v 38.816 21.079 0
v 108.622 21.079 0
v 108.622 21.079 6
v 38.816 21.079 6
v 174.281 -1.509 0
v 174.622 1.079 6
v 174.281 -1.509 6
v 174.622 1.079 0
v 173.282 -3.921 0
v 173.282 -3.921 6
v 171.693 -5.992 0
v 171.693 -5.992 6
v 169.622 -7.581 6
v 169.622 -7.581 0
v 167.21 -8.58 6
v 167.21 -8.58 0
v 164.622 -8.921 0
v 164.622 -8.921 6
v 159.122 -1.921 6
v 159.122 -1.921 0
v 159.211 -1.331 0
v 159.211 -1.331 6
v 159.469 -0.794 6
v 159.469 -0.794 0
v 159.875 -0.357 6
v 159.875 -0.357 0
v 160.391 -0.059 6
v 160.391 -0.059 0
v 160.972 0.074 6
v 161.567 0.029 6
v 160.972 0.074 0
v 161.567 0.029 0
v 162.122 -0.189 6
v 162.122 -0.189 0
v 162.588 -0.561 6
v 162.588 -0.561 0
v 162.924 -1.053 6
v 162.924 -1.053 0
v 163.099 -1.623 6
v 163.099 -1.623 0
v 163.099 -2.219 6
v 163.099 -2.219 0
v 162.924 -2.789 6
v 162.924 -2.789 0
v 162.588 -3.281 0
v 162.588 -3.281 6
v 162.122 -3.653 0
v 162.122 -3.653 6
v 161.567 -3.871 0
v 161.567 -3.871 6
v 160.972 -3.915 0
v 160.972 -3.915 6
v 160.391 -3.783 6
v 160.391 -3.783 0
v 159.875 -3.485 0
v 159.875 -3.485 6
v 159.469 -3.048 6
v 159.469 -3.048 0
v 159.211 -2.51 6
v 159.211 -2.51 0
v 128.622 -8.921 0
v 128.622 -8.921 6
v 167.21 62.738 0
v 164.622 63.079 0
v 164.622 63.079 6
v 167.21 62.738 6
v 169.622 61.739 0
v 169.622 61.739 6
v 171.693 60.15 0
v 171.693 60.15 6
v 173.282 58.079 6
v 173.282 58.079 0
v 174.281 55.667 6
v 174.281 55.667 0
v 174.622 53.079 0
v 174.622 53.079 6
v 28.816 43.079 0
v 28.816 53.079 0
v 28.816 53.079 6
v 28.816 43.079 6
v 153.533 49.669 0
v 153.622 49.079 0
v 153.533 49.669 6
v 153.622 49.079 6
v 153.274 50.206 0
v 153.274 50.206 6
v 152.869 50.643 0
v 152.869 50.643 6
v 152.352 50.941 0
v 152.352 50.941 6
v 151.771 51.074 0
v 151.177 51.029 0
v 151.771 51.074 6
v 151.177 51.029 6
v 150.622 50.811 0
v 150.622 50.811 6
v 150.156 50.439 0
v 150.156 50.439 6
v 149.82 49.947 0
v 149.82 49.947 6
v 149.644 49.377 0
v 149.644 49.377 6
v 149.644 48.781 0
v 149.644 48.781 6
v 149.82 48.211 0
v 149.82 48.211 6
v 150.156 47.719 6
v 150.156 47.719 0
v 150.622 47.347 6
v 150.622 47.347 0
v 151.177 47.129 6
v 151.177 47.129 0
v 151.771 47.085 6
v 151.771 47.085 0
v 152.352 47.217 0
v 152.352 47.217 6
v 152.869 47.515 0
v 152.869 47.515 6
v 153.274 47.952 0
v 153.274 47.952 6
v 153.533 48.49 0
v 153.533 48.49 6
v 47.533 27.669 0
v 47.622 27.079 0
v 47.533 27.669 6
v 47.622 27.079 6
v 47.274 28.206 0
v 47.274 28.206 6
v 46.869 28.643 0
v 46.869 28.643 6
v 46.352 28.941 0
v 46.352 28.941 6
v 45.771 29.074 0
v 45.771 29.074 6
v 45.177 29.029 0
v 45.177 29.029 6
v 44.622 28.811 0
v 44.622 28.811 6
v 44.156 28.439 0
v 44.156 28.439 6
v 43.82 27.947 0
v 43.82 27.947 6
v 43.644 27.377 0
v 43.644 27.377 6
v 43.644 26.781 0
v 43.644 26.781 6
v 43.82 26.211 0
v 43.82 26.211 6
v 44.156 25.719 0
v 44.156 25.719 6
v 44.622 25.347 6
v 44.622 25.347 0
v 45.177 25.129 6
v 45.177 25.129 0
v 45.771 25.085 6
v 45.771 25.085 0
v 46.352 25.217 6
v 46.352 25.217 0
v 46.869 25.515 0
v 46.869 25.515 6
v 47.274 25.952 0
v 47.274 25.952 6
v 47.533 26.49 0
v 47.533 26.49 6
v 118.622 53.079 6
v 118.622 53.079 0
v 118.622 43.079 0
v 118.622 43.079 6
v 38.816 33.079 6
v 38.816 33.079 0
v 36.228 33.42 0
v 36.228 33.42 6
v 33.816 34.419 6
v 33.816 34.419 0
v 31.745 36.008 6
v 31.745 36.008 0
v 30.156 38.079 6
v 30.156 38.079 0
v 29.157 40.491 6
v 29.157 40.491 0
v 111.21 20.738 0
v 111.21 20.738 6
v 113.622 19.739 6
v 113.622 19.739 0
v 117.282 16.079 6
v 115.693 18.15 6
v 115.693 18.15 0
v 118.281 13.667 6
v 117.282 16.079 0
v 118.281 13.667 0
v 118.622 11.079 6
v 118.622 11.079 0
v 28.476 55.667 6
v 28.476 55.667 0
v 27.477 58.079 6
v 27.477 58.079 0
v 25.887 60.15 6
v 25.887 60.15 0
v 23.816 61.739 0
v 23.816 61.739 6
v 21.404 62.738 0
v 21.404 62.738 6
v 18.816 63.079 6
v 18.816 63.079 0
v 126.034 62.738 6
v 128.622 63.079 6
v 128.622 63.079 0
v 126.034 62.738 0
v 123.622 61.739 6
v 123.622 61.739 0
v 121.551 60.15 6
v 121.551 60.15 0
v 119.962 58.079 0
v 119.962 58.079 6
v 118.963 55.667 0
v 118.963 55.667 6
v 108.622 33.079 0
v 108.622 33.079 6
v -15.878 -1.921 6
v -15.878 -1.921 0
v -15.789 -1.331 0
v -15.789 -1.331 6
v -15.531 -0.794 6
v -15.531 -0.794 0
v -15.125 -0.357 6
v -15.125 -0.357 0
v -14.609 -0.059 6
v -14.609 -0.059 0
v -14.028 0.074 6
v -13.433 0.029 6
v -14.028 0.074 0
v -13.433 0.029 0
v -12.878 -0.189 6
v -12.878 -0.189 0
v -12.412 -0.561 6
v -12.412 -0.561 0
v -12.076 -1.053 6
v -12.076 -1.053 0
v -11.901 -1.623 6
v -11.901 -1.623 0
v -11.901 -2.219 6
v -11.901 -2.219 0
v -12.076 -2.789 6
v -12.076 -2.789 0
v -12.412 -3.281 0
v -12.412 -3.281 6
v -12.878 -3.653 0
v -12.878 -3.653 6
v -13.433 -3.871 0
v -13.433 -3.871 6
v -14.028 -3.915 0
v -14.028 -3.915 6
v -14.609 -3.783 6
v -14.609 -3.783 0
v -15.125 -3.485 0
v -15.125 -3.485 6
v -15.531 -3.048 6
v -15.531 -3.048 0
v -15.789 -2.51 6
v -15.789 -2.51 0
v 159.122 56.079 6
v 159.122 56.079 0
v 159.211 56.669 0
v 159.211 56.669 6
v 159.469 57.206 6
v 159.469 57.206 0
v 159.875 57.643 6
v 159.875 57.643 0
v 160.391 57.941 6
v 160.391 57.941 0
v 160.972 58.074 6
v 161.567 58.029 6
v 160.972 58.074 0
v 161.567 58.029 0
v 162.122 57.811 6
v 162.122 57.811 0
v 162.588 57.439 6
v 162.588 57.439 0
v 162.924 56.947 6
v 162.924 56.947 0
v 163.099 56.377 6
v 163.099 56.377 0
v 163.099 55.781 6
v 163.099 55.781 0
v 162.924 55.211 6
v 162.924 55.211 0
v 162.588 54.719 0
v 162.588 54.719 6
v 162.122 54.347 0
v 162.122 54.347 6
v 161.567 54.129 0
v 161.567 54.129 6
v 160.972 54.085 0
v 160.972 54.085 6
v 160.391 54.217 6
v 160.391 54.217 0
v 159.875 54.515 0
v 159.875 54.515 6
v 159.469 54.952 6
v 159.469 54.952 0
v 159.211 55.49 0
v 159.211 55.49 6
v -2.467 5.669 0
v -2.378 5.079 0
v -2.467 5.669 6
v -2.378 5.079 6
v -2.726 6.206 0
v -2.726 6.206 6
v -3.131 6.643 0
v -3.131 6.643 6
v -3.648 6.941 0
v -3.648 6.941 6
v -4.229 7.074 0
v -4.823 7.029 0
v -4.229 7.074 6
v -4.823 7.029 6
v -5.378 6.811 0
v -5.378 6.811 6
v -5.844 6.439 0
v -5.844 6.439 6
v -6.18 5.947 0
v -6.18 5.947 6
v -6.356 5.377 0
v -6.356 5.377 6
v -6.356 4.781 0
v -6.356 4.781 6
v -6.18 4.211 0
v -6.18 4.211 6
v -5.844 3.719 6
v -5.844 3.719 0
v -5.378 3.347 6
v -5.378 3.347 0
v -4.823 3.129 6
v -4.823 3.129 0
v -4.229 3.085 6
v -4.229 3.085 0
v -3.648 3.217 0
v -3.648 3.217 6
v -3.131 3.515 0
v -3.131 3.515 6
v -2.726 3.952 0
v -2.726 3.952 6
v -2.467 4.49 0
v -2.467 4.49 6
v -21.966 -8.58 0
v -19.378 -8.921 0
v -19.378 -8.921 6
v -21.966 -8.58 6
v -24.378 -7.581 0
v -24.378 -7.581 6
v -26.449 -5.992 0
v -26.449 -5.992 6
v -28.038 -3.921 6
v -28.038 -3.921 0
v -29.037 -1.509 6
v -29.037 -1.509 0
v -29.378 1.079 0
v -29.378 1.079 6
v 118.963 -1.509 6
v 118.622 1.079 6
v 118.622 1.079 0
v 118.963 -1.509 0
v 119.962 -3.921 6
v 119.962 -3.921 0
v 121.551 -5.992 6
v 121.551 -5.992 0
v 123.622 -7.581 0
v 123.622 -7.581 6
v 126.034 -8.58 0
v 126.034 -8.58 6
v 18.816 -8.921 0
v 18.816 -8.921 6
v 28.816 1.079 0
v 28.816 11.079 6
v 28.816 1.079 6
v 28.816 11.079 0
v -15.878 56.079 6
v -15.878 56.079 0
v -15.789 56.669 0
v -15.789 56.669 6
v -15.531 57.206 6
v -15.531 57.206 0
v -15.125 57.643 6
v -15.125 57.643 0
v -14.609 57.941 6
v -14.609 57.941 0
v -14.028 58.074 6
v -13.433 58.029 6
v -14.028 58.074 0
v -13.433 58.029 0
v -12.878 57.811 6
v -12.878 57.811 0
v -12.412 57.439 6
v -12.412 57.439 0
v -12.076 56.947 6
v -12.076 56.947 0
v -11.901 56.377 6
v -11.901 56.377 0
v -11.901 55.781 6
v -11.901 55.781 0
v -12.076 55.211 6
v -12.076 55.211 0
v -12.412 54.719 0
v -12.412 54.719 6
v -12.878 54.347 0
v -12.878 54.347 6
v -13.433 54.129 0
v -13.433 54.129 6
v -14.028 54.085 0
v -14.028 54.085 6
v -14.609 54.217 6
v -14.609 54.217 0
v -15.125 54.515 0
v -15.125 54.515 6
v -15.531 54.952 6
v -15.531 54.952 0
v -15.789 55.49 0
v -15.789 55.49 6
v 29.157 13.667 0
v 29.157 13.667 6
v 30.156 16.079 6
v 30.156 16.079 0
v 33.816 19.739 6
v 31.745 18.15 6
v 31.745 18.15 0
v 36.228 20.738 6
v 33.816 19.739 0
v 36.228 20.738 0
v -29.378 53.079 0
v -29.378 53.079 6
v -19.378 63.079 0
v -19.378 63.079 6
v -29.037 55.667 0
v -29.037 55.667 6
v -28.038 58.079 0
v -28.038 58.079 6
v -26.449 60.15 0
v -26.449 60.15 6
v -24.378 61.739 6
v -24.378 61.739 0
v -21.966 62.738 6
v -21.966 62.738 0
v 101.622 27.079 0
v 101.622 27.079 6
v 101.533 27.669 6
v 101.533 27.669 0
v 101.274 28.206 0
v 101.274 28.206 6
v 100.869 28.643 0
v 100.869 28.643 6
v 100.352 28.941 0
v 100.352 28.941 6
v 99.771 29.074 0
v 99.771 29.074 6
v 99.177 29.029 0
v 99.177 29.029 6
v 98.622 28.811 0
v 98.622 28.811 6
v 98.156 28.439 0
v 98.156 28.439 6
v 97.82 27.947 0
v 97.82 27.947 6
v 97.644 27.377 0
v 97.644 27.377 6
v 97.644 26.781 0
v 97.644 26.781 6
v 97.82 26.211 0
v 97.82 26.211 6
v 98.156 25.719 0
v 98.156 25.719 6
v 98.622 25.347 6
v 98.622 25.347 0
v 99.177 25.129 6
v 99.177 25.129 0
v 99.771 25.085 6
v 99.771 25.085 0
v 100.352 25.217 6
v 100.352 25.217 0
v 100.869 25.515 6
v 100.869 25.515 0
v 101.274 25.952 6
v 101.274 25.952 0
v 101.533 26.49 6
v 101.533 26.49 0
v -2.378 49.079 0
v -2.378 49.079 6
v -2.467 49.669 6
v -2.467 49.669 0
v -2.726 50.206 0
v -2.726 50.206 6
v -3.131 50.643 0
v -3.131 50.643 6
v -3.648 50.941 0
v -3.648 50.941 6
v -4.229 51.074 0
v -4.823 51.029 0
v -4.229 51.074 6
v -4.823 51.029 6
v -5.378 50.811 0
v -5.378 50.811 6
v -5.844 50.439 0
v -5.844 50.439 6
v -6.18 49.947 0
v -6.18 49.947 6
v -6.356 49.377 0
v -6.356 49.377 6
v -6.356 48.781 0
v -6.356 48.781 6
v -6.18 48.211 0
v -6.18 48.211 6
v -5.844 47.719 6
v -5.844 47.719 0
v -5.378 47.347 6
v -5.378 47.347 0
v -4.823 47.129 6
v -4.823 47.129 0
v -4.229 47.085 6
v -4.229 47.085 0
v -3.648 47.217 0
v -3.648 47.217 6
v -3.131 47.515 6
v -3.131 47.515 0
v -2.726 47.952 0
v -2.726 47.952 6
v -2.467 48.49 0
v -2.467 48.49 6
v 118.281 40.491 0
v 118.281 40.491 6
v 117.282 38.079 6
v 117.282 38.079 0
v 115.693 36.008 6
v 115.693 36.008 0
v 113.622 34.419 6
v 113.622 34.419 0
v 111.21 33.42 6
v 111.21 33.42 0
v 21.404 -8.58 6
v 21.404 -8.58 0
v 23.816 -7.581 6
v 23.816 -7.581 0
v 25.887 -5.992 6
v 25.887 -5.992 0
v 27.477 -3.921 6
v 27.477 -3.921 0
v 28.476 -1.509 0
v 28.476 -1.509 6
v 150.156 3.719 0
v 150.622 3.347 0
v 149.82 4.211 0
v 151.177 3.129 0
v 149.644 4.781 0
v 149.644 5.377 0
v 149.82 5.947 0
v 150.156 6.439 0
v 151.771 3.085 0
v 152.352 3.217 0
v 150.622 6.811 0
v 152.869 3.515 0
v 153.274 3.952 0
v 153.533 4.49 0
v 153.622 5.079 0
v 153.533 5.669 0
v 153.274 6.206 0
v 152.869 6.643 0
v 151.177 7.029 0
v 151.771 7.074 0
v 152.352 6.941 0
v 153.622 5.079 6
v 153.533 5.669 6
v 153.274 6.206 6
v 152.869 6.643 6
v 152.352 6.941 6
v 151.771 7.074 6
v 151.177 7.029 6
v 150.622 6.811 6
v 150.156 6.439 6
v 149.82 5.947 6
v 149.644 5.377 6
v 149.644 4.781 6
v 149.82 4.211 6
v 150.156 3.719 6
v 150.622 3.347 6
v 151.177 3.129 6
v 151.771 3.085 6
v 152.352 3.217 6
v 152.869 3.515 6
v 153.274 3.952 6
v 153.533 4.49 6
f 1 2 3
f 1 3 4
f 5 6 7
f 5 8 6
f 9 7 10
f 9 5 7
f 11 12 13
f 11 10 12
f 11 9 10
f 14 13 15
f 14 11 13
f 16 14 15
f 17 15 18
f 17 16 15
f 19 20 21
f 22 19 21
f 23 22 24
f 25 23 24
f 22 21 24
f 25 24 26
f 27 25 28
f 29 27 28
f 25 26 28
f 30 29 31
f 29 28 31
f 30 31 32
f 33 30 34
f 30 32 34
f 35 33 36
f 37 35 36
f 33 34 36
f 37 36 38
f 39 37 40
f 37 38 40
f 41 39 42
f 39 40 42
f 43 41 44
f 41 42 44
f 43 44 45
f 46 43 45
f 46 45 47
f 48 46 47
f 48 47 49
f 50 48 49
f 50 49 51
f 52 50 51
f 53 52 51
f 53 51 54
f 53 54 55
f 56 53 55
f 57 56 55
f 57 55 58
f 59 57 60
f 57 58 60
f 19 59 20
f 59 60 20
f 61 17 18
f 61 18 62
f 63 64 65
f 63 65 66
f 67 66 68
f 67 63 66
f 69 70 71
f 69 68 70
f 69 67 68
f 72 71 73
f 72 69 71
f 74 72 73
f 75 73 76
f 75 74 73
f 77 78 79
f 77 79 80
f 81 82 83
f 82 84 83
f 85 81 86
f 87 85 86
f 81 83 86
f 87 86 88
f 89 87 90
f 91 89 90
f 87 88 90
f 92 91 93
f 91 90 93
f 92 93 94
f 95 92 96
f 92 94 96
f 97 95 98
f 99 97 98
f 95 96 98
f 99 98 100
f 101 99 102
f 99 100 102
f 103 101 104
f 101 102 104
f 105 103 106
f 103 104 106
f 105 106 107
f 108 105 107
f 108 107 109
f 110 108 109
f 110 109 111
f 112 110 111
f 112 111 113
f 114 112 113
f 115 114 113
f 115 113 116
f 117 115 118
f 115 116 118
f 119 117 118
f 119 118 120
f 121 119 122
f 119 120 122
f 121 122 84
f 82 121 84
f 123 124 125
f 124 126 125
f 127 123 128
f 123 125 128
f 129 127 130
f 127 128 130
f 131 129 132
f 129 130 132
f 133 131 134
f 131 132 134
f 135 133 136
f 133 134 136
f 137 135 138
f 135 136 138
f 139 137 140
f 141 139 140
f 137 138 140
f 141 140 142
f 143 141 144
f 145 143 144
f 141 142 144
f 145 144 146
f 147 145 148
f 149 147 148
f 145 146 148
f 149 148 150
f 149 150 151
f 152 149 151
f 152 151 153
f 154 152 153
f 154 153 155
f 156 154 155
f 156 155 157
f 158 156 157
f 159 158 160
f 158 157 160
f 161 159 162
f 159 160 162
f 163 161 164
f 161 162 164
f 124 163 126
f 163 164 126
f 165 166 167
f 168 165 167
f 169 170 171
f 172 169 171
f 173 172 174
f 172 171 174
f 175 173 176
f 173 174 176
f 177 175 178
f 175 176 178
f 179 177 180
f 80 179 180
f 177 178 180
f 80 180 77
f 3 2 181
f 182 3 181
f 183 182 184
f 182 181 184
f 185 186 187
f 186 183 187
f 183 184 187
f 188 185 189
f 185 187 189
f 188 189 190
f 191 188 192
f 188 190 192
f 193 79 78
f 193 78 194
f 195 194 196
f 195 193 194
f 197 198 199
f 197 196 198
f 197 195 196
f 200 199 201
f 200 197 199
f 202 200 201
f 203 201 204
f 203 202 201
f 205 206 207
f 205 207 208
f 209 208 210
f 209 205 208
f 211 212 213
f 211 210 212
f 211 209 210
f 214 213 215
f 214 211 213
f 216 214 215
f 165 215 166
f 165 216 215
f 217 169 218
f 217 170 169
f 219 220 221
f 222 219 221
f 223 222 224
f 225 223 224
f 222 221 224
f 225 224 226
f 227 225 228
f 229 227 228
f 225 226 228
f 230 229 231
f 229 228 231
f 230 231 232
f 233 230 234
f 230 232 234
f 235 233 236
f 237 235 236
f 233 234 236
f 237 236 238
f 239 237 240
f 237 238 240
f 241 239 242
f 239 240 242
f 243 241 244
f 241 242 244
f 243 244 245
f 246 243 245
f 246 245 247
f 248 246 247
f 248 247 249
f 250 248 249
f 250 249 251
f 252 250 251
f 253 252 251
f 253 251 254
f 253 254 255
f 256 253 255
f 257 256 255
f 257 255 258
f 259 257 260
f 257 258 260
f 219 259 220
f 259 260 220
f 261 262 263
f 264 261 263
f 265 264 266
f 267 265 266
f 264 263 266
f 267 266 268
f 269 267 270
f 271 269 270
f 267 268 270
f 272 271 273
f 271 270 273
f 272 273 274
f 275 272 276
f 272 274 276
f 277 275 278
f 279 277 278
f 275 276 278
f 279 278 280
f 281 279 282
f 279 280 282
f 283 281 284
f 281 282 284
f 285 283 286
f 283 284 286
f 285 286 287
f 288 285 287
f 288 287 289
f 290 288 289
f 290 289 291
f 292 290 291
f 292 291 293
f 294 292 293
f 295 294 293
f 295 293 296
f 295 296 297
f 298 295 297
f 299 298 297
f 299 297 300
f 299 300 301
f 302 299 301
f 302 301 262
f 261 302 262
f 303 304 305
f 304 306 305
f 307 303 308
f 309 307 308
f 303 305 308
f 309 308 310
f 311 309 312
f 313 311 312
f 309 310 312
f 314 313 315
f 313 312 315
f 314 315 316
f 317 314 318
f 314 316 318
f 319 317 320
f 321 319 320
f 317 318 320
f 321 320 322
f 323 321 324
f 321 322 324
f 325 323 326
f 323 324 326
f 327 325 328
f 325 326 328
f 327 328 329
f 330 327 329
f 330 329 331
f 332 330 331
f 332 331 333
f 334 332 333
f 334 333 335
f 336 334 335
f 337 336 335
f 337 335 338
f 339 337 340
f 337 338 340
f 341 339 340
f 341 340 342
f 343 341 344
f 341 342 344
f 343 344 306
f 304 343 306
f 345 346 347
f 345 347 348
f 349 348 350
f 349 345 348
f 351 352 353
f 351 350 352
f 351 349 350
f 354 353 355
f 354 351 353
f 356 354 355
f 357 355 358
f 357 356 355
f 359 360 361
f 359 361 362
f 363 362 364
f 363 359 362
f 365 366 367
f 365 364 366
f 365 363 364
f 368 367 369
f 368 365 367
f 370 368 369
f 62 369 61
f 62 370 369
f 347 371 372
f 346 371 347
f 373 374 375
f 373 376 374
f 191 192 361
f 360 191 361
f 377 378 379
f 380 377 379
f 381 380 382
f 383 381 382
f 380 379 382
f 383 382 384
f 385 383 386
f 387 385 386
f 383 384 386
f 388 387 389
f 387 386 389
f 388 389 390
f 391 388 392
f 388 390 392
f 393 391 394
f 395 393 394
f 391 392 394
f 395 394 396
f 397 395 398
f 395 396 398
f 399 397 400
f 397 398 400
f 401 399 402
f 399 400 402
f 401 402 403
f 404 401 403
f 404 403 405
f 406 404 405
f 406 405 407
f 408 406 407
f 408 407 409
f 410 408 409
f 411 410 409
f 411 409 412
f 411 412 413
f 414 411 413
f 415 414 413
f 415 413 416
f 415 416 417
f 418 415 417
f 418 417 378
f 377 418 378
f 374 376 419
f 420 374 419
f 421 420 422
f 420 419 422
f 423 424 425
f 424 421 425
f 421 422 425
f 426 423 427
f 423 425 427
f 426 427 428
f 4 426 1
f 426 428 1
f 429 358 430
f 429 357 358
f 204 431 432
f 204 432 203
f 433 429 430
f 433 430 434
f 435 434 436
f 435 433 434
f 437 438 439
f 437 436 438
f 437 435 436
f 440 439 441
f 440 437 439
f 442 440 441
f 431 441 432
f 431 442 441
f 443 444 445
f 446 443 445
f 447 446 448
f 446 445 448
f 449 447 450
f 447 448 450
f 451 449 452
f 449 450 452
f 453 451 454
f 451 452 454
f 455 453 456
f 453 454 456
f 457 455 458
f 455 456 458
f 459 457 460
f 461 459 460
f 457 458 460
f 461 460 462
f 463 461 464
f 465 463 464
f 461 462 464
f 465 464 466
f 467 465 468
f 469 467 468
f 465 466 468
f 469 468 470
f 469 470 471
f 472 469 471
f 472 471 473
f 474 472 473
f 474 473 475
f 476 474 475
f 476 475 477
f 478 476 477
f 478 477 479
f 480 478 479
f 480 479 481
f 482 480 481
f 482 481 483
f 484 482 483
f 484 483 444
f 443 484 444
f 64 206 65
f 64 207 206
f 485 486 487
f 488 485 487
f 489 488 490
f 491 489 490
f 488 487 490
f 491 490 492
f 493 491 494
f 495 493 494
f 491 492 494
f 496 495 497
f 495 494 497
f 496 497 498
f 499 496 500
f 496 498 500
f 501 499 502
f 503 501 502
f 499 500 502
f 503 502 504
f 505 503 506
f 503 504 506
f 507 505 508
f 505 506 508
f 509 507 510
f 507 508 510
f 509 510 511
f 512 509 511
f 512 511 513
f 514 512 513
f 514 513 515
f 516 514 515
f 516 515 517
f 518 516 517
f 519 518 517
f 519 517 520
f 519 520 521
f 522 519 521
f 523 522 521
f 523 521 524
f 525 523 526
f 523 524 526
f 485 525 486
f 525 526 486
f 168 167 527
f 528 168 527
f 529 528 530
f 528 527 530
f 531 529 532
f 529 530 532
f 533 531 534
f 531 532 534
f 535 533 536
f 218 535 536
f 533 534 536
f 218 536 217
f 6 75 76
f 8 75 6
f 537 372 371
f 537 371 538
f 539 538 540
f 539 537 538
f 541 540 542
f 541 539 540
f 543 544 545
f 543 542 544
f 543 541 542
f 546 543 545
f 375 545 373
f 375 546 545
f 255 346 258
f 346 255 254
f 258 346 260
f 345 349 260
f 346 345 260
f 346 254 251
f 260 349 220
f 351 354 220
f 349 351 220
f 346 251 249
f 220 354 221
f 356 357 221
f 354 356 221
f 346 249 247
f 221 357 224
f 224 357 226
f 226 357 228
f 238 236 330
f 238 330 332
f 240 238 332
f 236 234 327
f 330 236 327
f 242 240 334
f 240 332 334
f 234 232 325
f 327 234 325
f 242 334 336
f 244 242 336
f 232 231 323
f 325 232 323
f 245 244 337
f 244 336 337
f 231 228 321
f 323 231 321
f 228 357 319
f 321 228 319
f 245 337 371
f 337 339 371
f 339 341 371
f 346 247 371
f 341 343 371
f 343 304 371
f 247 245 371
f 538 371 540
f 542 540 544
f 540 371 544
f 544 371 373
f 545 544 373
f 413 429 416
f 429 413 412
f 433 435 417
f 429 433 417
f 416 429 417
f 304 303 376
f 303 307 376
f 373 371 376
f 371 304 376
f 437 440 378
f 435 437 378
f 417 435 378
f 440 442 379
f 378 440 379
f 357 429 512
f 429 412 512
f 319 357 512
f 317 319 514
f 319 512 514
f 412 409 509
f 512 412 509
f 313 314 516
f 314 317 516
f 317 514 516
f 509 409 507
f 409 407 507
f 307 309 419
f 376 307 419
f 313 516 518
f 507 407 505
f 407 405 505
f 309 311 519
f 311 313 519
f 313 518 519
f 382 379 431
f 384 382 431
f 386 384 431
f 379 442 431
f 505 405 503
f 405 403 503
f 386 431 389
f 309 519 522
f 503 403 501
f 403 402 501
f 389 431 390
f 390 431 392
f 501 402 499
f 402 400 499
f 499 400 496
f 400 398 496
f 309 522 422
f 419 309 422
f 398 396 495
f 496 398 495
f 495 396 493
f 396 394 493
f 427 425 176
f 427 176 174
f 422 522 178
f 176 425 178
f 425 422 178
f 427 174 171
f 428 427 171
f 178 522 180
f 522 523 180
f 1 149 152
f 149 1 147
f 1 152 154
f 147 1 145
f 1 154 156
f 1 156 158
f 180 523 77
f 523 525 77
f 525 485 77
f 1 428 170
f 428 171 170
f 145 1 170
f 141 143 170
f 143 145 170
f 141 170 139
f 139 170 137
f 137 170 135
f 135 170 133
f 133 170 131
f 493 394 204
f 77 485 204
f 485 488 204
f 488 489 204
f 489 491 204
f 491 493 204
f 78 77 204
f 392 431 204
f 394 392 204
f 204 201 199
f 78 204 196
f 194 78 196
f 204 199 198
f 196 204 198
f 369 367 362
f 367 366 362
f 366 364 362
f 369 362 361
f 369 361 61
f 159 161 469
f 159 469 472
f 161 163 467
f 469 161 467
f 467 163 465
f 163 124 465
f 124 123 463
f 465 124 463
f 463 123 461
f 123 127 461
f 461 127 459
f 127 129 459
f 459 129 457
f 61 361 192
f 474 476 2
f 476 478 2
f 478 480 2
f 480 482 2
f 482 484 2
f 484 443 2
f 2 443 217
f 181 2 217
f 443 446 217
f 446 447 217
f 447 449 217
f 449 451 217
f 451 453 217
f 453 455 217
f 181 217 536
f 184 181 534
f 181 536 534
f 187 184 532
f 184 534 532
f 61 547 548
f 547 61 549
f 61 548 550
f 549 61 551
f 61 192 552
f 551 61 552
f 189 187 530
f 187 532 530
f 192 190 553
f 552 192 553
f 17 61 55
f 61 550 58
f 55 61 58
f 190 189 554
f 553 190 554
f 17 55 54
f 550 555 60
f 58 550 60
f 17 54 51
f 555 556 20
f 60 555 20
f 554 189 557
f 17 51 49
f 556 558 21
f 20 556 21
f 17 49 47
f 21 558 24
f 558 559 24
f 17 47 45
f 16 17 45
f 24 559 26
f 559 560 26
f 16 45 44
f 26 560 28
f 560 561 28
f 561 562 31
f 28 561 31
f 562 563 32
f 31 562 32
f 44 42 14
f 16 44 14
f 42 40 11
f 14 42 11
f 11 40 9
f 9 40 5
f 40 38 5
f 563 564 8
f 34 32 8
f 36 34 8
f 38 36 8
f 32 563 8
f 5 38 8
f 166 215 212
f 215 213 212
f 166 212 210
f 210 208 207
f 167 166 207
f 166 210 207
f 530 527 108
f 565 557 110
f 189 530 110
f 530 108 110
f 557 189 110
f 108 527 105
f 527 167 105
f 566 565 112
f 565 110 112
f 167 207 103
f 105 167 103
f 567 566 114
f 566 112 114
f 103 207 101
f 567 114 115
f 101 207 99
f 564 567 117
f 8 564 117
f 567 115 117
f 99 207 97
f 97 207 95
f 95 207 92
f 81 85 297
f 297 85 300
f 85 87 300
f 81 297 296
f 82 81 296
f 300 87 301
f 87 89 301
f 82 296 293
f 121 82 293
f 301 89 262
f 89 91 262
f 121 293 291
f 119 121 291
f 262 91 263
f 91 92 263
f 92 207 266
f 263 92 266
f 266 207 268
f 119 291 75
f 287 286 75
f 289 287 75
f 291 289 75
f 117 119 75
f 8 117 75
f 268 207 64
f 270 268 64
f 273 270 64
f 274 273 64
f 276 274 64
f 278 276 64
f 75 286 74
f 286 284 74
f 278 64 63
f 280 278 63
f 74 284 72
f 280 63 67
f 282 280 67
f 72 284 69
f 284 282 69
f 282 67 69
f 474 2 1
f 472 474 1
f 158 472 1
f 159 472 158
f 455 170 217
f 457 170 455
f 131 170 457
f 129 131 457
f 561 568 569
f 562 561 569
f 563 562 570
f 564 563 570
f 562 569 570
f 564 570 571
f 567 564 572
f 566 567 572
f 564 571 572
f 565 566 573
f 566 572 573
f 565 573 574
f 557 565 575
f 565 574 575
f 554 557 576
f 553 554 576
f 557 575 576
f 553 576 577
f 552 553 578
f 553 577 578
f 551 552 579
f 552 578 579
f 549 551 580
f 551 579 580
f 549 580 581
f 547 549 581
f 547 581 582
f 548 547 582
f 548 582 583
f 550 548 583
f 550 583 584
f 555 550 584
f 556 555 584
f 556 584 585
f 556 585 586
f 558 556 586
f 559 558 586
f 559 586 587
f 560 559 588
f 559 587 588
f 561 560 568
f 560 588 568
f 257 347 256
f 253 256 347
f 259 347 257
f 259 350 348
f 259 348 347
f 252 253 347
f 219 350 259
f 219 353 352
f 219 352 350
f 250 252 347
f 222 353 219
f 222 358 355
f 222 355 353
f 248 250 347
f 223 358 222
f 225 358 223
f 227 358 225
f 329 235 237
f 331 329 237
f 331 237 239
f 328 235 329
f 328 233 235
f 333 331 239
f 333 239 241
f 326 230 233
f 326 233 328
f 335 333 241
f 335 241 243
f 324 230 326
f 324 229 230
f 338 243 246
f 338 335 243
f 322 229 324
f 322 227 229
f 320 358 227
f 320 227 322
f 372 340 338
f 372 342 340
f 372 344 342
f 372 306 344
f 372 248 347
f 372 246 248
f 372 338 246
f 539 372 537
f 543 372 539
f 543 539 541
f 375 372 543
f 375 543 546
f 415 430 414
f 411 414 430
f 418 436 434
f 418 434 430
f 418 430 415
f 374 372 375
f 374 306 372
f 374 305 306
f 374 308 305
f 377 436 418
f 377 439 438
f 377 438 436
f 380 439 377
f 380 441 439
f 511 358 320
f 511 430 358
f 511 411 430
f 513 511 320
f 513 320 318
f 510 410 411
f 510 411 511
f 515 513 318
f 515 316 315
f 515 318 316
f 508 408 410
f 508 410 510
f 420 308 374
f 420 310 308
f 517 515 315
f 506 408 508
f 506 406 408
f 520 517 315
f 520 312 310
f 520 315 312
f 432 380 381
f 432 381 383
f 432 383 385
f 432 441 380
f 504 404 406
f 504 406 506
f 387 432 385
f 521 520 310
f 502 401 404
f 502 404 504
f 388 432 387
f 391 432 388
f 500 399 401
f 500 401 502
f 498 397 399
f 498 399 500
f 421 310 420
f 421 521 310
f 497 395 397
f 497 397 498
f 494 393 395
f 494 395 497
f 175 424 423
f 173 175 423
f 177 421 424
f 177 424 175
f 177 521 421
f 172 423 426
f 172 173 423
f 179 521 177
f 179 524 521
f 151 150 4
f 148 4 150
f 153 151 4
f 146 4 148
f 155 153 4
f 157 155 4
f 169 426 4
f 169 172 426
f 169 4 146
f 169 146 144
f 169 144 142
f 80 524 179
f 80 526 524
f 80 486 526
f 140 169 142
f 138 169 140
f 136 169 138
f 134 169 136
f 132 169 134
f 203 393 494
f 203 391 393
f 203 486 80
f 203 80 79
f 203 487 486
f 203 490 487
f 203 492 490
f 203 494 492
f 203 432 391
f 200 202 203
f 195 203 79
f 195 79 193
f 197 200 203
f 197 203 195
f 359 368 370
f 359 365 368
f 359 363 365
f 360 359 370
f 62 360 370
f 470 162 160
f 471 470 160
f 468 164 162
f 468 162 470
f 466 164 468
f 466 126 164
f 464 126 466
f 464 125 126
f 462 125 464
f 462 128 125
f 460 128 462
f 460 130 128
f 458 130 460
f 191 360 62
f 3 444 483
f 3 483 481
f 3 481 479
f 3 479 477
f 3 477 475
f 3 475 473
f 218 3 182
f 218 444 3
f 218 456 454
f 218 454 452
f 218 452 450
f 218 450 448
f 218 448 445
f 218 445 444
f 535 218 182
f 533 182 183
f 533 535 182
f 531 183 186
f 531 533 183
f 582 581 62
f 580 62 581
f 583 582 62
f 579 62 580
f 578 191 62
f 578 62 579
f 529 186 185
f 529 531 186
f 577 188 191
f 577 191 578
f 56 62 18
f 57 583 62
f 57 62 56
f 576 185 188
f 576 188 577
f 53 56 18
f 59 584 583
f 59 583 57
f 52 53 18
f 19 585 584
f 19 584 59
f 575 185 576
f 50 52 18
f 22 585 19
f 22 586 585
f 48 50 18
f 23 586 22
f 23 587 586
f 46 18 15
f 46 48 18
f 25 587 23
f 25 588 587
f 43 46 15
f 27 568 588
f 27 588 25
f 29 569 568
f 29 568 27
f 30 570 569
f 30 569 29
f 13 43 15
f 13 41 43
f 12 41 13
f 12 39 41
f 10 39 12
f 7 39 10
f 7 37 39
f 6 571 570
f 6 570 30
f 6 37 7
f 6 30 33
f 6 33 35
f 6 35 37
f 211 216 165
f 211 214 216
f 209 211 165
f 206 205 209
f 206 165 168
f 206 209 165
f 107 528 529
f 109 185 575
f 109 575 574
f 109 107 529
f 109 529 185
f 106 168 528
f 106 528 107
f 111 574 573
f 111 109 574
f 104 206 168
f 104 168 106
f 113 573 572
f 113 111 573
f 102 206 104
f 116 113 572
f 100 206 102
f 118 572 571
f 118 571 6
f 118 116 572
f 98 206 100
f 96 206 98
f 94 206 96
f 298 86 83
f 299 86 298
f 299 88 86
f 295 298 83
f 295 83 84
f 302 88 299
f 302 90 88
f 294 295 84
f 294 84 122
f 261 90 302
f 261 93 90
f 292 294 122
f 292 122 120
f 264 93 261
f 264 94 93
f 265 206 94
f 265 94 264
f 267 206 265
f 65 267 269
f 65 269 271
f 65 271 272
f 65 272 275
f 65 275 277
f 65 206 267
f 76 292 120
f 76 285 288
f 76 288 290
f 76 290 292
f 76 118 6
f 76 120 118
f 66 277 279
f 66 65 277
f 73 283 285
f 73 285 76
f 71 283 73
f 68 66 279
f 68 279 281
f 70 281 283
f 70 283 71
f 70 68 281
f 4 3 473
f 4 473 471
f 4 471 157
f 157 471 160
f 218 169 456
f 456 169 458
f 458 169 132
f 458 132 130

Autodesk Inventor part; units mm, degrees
ref_plane "YZ Plane" through (0, 0, 0) normal (1, 0, 0) x (0, 1, 0)
sketch "Sketch1" plane through (0, 0, 0) normal (0, 0, 1) x (1, 0, 0)
  line L0 (-19.3782, 63.0791) -> (164.6218, 63.0791)
  line L1 (174.6218, 53.0791) -> (174.6218, 1.0791)
  line L2 (164.6218, -8.9209) -> (-19.3782, -8.9209)
  line L3 (-29.3782, 1.0791) -> (-29.3782, 53.0791)
  arc A0 (-19.3782, 63.0791) -> (-29.3782, 53.0791) centre (-19.3782, 53.0791) ccw
  arc A1 (-29.3782, 1.0791) -> (-19.3782, -8.9209) centre (-19.3782, 1.0791) ccw
  arc A2 (164.6218, -8.9209) -> (174.6218, 1.0791) centre (164.6218, 1.0791) ccw
  arc A3 (174.6218, 53.0791) -> (164.6218, 63.0791) centre (164.6218, 53.0791) ccw
  point P0 (0, 0)
  point P1 (-29.3782, 63.0791)
  point P2 (174.6218, -8.9209)
  point P3 (-29.3782, -8.9209)
  dimension "d0" = 204
  dimension "d1" = 72
  dimension "d2" = 10
extrude "Extrusion1" add sketch "Sketch1" along normal blind 6
sketch "Sketch4" plane through (0, 0, 6) normal (0, 0, 1) x (1, 0, 0)
  circle A0 centre (-4.3782, 5.0791) radius 2
  circle A1 centre (-19.3782, 14.5791) radius 2 projected
  circle A2 centre (-4.3782, 49.0791) radius 2
  circle A3 centre (-19.3782, 39.5791) radius 2 projected
  line L0 (164.6218, 63.0791) -> (-19.3782, 63.0791) projected
  line L1 (72.6218, 63.0791) -> (72.6218, -8.9209)
  line L2 (-19.3782, -8.9209) -> (164.6218, -8.9209) projected
  circle A4 centre (151.6218, 5.0791) radius 2
  circle A5 centre (151.6218, 49.0791) radius 2
  line L3 (-29.3782, 53.0791) -> (-29.3782, 1.0791) projected
  point P0 (0, 0)
  dimension "d17" = 4
  dimension "d19" = 4
  dimension "d38" = 14
  dimension "d39" = 14
  dimension "d40" = 25
  dimension "d41" = 25
  dimension "d43" = 156
  dimension "d44" = 156
  dimension "d45" = 79
extrude "Extrusion4" cut sketch "Sketch4" against normal blind 6 contours A0 | A2 | A4 | A5
ref_plane "Work Plane1" through (74.6218, 1.0791, 0) normal (1, 0, 0) x (0, 0, -1)
ref_plane "Work Plane2" through (-19.3782, 27.0791, 0) normal (0, -1, 0) x (1, 0, 0)
sketch "Sketch5" plane through (0, 0, 0) normal (0, 0, -1) x (-1, 0, 0)
  line L0 (-41.6218, -8.9209) -> (-72.6218, -8.9209)
  line L1 (-72.6218, -8.9209) -> (-72.6218, 21.0791)
  line L2 (-72.6218, 21.0791) -> (-41.6218, 21.0791)
  line L3 (-41.6218, 21.0791) -> (-41.6218, -8.9209)
  line L4 (19.3782, -8.9209) -> (-164.6218, -8.9209) projected
  line L5 (-164.6218, 63.0791) -> (19.3782, 63.0791) projected
  line L6 (-72.6218, -8.9209) -> (-103.6218, -8.9209)
  line L7 (-103.6218, -8.9209) -> (-103.6218, 21.0791)
  line L8 (-103.6218, 21.0791) -> (-72.6218, 21.0791)
  line L9 (-72.6218, 21.0791) -> (-72.6218, -8.9209)
  line L10 (-43.8163, 63.0791) -> (-72.6218, 63.0791)
  line L11 (-72.6218, 63.0791) -> (-72.6218, 33.0791)
  line L12 (-72.6218, 33.0791) -> (-53.8163, 33.0791)
  line L13 (-43.8163, 32.0791) -> (-43.8163, 63.0791)
  line L14 (-72.6218, 33.0791) -> (-93.6218, 33.0791)
  line L15 (-103.6218, 31.0791) -> (-103.6218, 63.0791)
  line L16 (-103.6218, 63.0791) -> (-72.6218, 63.0791)
  line L17 (-72.6218, 63.0791) -> (-72.6218, 33.0791)
  line L18 (-41.6218, -8.9209) -> (-6.6218, -8.9209)
  line L19 (-43.8163, 63.0791) -> (-11.7113, 63.0791)
  line L20 (-103.6218, -8.9209) -> (-138.6218, -8.9209)
  line L21 (-103.6218, 63.0791) -> (-138.6218, 63.0791)
  line L22 (-43.8163, 63.0791) -> (-28.8163, 63.0791)
  line L23 (-28.8163, 63.0791) -> (-28.8163, 51.444)
  line L24 (-43.8163, 32.0791) -> (-43.8163, 63.0791)
  line L25 (-103.6218, 63.0791) -> (-118.6218, 63.0791)
  line L26 (-118.6218, 63.0791) -> (-118.6218, 50.444)
  line L27 (-103.6218, 31.0791) -> (-103.6218, 63.0791)
  line L28 (-72.6218, -8.9209) -> (-72.6218, 21.0791)
  line L29 (-72.6218, 33.0791) -> (-72.6218, 63.0791)
  line L30 (-28.8163, 51.444) -> (-28.8163, 43.0791)
  line L31 (-38.8163, 33.0791) -> (-53.8163, 33.0791)
  line L32 (-93.6218, 33.0791) -> (-108.6218, 33.0791)
  line L33 (-118.6218, 43.0791) -> (-118.6218, 50.444)
  arc A0 (-38.8163, 33.0791) -> (-28.8163, 43.0791) centre (-38.8163, 43.0791) ccw
  arc A1 (-118.6218, 43.0791) -> (-108.6218, 33.0791) centre (-108.6218, 43.0791) ccw
  line L34 (29.3782, 1.0791) -> (29.3782, 53.0791) projected
  point P0 (0, 0)
  dimension "d25" = 31
  dimension "d26" = 30
  dimension "d27" = 31
  dimension "d28" = 30
  dimension "d29" = 35
  dimension "d30" = 35
  dimension "d46" = 15
  dimension "d47" = 15
  dimension "d48" = 10
  dimension "d61" = 102
extrude "Extrusion5" cut sketch "Sketch5" against normal blind 6 contours L5 L15 L32 A1 L33 L26 | L5 L11 L14 L32 L15 | L5 L13 L31 L12 L11 | L5 L23 L30 A0 L31 L13
ref_plane "Work Plane3" through (-19.3782, 27.0791, 6) normal (0, 1, 0) x (1, 0, 0)
mirror "Mirror1" about plane through (-19.3782, 27.0791, 6) normal (0, 1, 0) of "Extrusion5"
fillet "Fillet1" radius 10 4 edges at (118.6218, 63.0791, 3) (28.8163, 63.0791, 3) (28.8163, -8.9209, 3) (118.6218, -8.9209, 3)
sketch "Sketch7" plane through (0, 0, 0) normal (0, 0, -1) x (-1, 0, 0)
  circle A0 centre (13.8782, -1.9209) radius 2
  circle A1 centre (13.8782, 56.0791) radius 2
  circle A2 centre (-161.1218, 56.0791) radius 2
  circle A3 centre (-161.1218, -1.9209) radius 2
  line L0 (-28.8163, 53.0791) -> (-28.8163, 43.0791) projected
  line L1 (-28.8163, 11.0791) -> (-28.8163, 1.0791) projected
  line L2 (-118.6218, 1.0791) -> (-118.6218, 11.0791) projected
  line L3 (-118.6218, 43.0791) -> (-118.6218, 53.0791) projected
  point P0 (0, 0)
  point P1 (-161.1218, 5.0791)
  dimension "d49" = 4
  dimension "d50" = 4
  dimension "d54" = 7
  dimension "d57" = 42.6945
  dimension "d58" = 42.6945
  dimension "d59" = 42.5
  dimension "d60" = 42.5
extrude "Extrusion6" cut sketch "Sketch7" against normal blind 6
sketch "Sketch8" plane through (0, 0, 6) normal (0, 0, 1) x (1, 0, 0)
  line L0 (-29.3782, 1.0791) -> (-29.3782, 53.0791) projected
  line L1 (-29.3782, 27.0791) -> (174.6218, 27.0791)
  line L2 (174.6218, 53.0791) -> (174.6218, 1.0791) projected
  circle A0 centre (45.6218, 27.0791) radius 2
  circle A1 centre (99.6218, 27.0791) radius 2
  point P0 (0, 0)
  dimension "d62" = 4
  dimension "d63" = 4
  dimension "d64" = 75
  dimension "d65" = 75
extrude "Extrusion7" cut sketch "Sketch8" against normal blind 6
properties part number "top plate" material "UHMW, White"
